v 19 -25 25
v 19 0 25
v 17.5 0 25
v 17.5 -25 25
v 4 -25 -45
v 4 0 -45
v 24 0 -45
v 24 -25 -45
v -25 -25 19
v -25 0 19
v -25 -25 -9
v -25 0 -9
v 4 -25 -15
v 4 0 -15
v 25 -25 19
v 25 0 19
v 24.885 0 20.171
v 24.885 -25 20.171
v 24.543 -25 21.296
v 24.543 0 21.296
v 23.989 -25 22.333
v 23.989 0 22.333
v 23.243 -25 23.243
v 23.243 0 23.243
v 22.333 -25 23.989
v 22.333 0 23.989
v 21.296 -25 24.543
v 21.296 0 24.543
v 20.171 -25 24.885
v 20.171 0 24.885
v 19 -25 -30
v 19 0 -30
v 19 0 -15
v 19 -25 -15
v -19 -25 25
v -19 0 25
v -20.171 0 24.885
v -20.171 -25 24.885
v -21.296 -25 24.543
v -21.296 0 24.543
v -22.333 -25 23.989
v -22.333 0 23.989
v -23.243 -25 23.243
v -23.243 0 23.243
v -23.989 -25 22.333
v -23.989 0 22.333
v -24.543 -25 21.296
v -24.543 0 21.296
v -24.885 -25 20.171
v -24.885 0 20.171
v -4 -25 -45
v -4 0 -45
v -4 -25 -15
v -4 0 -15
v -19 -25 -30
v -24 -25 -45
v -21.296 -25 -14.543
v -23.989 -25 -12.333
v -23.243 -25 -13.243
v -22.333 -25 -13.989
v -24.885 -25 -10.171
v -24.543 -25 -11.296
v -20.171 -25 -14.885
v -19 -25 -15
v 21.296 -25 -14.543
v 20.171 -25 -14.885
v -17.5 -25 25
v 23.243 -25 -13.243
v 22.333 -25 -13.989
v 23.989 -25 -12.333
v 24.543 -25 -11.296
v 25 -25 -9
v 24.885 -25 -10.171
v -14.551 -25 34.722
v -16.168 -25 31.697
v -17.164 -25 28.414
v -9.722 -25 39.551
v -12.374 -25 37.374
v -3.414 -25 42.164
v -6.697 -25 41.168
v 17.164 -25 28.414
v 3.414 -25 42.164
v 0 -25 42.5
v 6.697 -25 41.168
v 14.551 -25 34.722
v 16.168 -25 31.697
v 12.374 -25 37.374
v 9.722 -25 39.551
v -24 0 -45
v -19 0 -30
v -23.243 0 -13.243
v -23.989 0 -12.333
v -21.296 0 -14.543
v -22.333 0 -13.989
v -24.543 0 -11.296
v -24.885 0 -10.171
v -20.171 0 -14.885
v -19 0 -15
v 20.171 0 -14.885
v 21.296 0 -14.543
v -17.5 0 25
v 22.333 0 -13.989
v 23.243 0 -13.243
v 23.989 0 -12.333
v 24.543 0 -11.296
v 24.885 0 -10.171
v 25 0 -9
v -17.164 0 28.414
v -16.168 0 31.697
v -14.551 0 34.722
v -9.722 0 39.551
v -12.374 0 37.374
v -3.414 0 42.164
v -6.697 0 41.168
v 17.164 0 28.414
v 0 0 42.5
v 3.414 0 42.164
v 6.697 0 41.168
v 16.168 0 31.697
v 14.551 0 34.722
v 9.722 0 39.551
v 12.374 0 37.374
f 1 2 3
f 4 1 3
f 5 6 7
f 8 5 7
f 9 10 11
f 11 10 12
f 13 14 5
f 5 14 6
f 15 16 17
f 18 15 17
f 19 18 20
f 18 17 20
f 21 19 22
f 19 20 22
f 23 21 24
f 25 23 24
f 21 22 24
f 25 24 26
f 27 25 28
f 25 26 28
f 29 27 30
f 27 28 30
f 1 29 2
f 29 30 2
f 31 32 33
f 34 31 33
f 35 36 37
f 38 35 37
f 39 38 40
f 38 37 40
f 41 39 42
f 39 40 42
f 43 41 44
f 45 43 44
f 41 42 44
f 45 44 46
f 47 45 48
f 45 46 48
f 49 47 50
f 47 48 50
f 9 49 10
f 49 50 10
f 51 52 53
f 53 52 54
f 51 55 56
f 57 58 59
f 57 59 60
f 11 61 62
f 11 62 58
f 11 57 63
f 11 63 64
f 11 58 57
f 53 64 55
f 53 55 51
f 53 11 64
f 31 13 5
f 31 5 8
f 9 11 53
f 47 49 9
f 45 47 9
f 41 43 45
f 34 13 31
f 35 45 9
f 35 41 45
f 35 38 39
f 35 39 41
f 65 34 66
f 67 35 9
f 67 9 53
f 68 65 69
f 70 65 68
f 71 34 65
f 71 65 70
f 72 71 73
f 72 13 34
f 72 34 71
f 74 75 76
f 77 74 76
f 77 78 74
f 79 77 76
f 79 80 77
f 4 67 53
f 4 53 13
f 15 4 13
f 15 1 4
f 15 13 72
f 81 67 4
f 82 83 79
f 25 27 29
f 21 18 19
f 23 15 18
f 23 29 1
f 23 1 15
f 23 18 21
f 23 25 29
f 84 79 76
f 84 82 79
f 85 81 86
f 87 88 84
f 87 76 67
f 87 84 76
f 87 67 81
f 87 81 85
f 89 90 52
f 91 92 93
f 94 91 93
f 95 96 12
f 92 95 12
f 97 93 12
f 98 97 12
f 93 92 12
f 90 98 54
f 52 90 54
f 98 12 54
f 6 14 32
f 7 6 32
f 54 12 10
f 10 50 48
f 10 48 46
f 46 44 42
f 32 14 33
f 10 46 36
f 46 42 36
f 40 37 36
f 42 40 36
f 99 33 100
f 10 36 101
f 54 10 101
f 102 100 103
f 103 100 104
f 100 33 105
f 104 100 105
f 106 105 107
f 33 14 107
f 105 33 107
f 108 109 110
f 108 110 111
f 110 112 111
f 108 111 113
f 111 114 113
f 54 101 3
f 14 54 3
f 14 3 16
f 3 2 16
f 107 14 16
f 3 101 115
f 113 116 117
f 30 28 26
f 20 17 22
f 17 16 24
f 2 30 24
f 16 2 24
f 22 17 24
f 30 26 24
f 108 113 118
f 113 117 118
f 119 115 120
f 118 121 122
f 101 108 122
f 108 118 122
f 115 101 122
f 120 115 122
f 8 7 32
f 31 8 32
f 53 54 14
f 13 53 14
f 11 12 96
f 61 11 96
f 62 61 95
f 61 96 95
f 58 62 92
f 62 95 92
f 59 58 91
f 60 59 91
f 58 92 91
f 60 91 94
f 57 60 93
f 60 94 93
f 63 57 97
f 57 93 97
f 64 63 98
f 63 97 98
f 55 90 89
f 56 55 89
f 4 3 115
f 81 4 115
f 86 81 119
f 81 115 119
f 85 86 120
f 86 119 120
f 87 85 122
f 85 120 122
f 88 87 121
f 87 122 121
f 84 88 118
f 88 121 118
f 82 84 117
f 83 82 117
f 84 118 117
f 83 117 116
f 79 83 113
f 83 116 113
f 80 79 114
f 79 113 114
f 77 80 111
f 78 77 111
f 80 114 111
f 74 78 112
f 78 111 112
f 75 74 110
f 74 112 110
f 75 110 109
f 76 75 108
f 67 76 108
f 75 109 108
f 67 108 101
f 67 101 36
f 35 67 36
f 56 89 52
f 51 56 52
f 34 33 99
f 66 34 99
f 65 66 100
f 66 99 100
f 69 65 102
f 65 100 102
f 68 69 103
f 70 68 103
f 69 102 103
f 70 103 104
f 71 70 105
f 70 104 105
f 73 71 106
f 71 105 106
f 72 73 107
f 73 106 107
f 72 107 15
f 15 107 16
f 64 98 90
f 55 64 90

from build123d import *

# Parameters (mm, degrees)
F1_DEPTH = 25


with BuildPart() as f1:
    # F0 (on Front) → F1 (new body)
    with BuildSketch(Plane.XZ):
        with BuildLine():
            ThreePointArc((-25, -9), (-23.2426406871, -13.2426406871), (-19, -15))
            Line((-19, -15), (-4, -15))
            Line((-4, -15), (4, -15))
            Line((4, -15), (19, -15))
            ThreePointArc((19, -15), (23.2426406871, -13.2426406871), (25, -9))
            Line((25, -9), (25, 19))
            ThreePointArc((25, 19), (23.2426406871, 23.2426406871), (19, 25))
            Line((19, 25), (17.5, 25))
            ThreePointArc((17.5, 25), (0, 7.5), (-17.5, 25))
            Line((-17.5, 25), (-19, 25))
            ThreePointArc((-19, 25), (-23.2426406871, 23.2426406871), (-25, 19))
            Line((-25, 19), (-25, -9))
        make_face()
        Polygon((-4, -15), (-19, -15), (-19, -30), (-19, -45), (-4, -45), align=None)
        Polygon((-19, -45), (-19, -30), (-24, -45), align=None)
        Polygon((19, -15), (4, -15), (4, -45), (19, -45), (19, -30), align=None)
        Polygon((24, -45), (19, -30), (19, -45), align=None)
        with BuildLine():
            ThreePointArc((17.5, 25), (0, 42.5), (-17.5, 25))
            Line((-17.5, 25), (17.5, 25))
        make_face()
        with BuildLine():
            Line((17.5, 25), (-17.5, 25))
            ThreePointArc((-17.5, 25), (0, 7.5), (17.5, 25))
        make_face()
    extrude(amount=F1_DEPTH)


solid = f1.part
